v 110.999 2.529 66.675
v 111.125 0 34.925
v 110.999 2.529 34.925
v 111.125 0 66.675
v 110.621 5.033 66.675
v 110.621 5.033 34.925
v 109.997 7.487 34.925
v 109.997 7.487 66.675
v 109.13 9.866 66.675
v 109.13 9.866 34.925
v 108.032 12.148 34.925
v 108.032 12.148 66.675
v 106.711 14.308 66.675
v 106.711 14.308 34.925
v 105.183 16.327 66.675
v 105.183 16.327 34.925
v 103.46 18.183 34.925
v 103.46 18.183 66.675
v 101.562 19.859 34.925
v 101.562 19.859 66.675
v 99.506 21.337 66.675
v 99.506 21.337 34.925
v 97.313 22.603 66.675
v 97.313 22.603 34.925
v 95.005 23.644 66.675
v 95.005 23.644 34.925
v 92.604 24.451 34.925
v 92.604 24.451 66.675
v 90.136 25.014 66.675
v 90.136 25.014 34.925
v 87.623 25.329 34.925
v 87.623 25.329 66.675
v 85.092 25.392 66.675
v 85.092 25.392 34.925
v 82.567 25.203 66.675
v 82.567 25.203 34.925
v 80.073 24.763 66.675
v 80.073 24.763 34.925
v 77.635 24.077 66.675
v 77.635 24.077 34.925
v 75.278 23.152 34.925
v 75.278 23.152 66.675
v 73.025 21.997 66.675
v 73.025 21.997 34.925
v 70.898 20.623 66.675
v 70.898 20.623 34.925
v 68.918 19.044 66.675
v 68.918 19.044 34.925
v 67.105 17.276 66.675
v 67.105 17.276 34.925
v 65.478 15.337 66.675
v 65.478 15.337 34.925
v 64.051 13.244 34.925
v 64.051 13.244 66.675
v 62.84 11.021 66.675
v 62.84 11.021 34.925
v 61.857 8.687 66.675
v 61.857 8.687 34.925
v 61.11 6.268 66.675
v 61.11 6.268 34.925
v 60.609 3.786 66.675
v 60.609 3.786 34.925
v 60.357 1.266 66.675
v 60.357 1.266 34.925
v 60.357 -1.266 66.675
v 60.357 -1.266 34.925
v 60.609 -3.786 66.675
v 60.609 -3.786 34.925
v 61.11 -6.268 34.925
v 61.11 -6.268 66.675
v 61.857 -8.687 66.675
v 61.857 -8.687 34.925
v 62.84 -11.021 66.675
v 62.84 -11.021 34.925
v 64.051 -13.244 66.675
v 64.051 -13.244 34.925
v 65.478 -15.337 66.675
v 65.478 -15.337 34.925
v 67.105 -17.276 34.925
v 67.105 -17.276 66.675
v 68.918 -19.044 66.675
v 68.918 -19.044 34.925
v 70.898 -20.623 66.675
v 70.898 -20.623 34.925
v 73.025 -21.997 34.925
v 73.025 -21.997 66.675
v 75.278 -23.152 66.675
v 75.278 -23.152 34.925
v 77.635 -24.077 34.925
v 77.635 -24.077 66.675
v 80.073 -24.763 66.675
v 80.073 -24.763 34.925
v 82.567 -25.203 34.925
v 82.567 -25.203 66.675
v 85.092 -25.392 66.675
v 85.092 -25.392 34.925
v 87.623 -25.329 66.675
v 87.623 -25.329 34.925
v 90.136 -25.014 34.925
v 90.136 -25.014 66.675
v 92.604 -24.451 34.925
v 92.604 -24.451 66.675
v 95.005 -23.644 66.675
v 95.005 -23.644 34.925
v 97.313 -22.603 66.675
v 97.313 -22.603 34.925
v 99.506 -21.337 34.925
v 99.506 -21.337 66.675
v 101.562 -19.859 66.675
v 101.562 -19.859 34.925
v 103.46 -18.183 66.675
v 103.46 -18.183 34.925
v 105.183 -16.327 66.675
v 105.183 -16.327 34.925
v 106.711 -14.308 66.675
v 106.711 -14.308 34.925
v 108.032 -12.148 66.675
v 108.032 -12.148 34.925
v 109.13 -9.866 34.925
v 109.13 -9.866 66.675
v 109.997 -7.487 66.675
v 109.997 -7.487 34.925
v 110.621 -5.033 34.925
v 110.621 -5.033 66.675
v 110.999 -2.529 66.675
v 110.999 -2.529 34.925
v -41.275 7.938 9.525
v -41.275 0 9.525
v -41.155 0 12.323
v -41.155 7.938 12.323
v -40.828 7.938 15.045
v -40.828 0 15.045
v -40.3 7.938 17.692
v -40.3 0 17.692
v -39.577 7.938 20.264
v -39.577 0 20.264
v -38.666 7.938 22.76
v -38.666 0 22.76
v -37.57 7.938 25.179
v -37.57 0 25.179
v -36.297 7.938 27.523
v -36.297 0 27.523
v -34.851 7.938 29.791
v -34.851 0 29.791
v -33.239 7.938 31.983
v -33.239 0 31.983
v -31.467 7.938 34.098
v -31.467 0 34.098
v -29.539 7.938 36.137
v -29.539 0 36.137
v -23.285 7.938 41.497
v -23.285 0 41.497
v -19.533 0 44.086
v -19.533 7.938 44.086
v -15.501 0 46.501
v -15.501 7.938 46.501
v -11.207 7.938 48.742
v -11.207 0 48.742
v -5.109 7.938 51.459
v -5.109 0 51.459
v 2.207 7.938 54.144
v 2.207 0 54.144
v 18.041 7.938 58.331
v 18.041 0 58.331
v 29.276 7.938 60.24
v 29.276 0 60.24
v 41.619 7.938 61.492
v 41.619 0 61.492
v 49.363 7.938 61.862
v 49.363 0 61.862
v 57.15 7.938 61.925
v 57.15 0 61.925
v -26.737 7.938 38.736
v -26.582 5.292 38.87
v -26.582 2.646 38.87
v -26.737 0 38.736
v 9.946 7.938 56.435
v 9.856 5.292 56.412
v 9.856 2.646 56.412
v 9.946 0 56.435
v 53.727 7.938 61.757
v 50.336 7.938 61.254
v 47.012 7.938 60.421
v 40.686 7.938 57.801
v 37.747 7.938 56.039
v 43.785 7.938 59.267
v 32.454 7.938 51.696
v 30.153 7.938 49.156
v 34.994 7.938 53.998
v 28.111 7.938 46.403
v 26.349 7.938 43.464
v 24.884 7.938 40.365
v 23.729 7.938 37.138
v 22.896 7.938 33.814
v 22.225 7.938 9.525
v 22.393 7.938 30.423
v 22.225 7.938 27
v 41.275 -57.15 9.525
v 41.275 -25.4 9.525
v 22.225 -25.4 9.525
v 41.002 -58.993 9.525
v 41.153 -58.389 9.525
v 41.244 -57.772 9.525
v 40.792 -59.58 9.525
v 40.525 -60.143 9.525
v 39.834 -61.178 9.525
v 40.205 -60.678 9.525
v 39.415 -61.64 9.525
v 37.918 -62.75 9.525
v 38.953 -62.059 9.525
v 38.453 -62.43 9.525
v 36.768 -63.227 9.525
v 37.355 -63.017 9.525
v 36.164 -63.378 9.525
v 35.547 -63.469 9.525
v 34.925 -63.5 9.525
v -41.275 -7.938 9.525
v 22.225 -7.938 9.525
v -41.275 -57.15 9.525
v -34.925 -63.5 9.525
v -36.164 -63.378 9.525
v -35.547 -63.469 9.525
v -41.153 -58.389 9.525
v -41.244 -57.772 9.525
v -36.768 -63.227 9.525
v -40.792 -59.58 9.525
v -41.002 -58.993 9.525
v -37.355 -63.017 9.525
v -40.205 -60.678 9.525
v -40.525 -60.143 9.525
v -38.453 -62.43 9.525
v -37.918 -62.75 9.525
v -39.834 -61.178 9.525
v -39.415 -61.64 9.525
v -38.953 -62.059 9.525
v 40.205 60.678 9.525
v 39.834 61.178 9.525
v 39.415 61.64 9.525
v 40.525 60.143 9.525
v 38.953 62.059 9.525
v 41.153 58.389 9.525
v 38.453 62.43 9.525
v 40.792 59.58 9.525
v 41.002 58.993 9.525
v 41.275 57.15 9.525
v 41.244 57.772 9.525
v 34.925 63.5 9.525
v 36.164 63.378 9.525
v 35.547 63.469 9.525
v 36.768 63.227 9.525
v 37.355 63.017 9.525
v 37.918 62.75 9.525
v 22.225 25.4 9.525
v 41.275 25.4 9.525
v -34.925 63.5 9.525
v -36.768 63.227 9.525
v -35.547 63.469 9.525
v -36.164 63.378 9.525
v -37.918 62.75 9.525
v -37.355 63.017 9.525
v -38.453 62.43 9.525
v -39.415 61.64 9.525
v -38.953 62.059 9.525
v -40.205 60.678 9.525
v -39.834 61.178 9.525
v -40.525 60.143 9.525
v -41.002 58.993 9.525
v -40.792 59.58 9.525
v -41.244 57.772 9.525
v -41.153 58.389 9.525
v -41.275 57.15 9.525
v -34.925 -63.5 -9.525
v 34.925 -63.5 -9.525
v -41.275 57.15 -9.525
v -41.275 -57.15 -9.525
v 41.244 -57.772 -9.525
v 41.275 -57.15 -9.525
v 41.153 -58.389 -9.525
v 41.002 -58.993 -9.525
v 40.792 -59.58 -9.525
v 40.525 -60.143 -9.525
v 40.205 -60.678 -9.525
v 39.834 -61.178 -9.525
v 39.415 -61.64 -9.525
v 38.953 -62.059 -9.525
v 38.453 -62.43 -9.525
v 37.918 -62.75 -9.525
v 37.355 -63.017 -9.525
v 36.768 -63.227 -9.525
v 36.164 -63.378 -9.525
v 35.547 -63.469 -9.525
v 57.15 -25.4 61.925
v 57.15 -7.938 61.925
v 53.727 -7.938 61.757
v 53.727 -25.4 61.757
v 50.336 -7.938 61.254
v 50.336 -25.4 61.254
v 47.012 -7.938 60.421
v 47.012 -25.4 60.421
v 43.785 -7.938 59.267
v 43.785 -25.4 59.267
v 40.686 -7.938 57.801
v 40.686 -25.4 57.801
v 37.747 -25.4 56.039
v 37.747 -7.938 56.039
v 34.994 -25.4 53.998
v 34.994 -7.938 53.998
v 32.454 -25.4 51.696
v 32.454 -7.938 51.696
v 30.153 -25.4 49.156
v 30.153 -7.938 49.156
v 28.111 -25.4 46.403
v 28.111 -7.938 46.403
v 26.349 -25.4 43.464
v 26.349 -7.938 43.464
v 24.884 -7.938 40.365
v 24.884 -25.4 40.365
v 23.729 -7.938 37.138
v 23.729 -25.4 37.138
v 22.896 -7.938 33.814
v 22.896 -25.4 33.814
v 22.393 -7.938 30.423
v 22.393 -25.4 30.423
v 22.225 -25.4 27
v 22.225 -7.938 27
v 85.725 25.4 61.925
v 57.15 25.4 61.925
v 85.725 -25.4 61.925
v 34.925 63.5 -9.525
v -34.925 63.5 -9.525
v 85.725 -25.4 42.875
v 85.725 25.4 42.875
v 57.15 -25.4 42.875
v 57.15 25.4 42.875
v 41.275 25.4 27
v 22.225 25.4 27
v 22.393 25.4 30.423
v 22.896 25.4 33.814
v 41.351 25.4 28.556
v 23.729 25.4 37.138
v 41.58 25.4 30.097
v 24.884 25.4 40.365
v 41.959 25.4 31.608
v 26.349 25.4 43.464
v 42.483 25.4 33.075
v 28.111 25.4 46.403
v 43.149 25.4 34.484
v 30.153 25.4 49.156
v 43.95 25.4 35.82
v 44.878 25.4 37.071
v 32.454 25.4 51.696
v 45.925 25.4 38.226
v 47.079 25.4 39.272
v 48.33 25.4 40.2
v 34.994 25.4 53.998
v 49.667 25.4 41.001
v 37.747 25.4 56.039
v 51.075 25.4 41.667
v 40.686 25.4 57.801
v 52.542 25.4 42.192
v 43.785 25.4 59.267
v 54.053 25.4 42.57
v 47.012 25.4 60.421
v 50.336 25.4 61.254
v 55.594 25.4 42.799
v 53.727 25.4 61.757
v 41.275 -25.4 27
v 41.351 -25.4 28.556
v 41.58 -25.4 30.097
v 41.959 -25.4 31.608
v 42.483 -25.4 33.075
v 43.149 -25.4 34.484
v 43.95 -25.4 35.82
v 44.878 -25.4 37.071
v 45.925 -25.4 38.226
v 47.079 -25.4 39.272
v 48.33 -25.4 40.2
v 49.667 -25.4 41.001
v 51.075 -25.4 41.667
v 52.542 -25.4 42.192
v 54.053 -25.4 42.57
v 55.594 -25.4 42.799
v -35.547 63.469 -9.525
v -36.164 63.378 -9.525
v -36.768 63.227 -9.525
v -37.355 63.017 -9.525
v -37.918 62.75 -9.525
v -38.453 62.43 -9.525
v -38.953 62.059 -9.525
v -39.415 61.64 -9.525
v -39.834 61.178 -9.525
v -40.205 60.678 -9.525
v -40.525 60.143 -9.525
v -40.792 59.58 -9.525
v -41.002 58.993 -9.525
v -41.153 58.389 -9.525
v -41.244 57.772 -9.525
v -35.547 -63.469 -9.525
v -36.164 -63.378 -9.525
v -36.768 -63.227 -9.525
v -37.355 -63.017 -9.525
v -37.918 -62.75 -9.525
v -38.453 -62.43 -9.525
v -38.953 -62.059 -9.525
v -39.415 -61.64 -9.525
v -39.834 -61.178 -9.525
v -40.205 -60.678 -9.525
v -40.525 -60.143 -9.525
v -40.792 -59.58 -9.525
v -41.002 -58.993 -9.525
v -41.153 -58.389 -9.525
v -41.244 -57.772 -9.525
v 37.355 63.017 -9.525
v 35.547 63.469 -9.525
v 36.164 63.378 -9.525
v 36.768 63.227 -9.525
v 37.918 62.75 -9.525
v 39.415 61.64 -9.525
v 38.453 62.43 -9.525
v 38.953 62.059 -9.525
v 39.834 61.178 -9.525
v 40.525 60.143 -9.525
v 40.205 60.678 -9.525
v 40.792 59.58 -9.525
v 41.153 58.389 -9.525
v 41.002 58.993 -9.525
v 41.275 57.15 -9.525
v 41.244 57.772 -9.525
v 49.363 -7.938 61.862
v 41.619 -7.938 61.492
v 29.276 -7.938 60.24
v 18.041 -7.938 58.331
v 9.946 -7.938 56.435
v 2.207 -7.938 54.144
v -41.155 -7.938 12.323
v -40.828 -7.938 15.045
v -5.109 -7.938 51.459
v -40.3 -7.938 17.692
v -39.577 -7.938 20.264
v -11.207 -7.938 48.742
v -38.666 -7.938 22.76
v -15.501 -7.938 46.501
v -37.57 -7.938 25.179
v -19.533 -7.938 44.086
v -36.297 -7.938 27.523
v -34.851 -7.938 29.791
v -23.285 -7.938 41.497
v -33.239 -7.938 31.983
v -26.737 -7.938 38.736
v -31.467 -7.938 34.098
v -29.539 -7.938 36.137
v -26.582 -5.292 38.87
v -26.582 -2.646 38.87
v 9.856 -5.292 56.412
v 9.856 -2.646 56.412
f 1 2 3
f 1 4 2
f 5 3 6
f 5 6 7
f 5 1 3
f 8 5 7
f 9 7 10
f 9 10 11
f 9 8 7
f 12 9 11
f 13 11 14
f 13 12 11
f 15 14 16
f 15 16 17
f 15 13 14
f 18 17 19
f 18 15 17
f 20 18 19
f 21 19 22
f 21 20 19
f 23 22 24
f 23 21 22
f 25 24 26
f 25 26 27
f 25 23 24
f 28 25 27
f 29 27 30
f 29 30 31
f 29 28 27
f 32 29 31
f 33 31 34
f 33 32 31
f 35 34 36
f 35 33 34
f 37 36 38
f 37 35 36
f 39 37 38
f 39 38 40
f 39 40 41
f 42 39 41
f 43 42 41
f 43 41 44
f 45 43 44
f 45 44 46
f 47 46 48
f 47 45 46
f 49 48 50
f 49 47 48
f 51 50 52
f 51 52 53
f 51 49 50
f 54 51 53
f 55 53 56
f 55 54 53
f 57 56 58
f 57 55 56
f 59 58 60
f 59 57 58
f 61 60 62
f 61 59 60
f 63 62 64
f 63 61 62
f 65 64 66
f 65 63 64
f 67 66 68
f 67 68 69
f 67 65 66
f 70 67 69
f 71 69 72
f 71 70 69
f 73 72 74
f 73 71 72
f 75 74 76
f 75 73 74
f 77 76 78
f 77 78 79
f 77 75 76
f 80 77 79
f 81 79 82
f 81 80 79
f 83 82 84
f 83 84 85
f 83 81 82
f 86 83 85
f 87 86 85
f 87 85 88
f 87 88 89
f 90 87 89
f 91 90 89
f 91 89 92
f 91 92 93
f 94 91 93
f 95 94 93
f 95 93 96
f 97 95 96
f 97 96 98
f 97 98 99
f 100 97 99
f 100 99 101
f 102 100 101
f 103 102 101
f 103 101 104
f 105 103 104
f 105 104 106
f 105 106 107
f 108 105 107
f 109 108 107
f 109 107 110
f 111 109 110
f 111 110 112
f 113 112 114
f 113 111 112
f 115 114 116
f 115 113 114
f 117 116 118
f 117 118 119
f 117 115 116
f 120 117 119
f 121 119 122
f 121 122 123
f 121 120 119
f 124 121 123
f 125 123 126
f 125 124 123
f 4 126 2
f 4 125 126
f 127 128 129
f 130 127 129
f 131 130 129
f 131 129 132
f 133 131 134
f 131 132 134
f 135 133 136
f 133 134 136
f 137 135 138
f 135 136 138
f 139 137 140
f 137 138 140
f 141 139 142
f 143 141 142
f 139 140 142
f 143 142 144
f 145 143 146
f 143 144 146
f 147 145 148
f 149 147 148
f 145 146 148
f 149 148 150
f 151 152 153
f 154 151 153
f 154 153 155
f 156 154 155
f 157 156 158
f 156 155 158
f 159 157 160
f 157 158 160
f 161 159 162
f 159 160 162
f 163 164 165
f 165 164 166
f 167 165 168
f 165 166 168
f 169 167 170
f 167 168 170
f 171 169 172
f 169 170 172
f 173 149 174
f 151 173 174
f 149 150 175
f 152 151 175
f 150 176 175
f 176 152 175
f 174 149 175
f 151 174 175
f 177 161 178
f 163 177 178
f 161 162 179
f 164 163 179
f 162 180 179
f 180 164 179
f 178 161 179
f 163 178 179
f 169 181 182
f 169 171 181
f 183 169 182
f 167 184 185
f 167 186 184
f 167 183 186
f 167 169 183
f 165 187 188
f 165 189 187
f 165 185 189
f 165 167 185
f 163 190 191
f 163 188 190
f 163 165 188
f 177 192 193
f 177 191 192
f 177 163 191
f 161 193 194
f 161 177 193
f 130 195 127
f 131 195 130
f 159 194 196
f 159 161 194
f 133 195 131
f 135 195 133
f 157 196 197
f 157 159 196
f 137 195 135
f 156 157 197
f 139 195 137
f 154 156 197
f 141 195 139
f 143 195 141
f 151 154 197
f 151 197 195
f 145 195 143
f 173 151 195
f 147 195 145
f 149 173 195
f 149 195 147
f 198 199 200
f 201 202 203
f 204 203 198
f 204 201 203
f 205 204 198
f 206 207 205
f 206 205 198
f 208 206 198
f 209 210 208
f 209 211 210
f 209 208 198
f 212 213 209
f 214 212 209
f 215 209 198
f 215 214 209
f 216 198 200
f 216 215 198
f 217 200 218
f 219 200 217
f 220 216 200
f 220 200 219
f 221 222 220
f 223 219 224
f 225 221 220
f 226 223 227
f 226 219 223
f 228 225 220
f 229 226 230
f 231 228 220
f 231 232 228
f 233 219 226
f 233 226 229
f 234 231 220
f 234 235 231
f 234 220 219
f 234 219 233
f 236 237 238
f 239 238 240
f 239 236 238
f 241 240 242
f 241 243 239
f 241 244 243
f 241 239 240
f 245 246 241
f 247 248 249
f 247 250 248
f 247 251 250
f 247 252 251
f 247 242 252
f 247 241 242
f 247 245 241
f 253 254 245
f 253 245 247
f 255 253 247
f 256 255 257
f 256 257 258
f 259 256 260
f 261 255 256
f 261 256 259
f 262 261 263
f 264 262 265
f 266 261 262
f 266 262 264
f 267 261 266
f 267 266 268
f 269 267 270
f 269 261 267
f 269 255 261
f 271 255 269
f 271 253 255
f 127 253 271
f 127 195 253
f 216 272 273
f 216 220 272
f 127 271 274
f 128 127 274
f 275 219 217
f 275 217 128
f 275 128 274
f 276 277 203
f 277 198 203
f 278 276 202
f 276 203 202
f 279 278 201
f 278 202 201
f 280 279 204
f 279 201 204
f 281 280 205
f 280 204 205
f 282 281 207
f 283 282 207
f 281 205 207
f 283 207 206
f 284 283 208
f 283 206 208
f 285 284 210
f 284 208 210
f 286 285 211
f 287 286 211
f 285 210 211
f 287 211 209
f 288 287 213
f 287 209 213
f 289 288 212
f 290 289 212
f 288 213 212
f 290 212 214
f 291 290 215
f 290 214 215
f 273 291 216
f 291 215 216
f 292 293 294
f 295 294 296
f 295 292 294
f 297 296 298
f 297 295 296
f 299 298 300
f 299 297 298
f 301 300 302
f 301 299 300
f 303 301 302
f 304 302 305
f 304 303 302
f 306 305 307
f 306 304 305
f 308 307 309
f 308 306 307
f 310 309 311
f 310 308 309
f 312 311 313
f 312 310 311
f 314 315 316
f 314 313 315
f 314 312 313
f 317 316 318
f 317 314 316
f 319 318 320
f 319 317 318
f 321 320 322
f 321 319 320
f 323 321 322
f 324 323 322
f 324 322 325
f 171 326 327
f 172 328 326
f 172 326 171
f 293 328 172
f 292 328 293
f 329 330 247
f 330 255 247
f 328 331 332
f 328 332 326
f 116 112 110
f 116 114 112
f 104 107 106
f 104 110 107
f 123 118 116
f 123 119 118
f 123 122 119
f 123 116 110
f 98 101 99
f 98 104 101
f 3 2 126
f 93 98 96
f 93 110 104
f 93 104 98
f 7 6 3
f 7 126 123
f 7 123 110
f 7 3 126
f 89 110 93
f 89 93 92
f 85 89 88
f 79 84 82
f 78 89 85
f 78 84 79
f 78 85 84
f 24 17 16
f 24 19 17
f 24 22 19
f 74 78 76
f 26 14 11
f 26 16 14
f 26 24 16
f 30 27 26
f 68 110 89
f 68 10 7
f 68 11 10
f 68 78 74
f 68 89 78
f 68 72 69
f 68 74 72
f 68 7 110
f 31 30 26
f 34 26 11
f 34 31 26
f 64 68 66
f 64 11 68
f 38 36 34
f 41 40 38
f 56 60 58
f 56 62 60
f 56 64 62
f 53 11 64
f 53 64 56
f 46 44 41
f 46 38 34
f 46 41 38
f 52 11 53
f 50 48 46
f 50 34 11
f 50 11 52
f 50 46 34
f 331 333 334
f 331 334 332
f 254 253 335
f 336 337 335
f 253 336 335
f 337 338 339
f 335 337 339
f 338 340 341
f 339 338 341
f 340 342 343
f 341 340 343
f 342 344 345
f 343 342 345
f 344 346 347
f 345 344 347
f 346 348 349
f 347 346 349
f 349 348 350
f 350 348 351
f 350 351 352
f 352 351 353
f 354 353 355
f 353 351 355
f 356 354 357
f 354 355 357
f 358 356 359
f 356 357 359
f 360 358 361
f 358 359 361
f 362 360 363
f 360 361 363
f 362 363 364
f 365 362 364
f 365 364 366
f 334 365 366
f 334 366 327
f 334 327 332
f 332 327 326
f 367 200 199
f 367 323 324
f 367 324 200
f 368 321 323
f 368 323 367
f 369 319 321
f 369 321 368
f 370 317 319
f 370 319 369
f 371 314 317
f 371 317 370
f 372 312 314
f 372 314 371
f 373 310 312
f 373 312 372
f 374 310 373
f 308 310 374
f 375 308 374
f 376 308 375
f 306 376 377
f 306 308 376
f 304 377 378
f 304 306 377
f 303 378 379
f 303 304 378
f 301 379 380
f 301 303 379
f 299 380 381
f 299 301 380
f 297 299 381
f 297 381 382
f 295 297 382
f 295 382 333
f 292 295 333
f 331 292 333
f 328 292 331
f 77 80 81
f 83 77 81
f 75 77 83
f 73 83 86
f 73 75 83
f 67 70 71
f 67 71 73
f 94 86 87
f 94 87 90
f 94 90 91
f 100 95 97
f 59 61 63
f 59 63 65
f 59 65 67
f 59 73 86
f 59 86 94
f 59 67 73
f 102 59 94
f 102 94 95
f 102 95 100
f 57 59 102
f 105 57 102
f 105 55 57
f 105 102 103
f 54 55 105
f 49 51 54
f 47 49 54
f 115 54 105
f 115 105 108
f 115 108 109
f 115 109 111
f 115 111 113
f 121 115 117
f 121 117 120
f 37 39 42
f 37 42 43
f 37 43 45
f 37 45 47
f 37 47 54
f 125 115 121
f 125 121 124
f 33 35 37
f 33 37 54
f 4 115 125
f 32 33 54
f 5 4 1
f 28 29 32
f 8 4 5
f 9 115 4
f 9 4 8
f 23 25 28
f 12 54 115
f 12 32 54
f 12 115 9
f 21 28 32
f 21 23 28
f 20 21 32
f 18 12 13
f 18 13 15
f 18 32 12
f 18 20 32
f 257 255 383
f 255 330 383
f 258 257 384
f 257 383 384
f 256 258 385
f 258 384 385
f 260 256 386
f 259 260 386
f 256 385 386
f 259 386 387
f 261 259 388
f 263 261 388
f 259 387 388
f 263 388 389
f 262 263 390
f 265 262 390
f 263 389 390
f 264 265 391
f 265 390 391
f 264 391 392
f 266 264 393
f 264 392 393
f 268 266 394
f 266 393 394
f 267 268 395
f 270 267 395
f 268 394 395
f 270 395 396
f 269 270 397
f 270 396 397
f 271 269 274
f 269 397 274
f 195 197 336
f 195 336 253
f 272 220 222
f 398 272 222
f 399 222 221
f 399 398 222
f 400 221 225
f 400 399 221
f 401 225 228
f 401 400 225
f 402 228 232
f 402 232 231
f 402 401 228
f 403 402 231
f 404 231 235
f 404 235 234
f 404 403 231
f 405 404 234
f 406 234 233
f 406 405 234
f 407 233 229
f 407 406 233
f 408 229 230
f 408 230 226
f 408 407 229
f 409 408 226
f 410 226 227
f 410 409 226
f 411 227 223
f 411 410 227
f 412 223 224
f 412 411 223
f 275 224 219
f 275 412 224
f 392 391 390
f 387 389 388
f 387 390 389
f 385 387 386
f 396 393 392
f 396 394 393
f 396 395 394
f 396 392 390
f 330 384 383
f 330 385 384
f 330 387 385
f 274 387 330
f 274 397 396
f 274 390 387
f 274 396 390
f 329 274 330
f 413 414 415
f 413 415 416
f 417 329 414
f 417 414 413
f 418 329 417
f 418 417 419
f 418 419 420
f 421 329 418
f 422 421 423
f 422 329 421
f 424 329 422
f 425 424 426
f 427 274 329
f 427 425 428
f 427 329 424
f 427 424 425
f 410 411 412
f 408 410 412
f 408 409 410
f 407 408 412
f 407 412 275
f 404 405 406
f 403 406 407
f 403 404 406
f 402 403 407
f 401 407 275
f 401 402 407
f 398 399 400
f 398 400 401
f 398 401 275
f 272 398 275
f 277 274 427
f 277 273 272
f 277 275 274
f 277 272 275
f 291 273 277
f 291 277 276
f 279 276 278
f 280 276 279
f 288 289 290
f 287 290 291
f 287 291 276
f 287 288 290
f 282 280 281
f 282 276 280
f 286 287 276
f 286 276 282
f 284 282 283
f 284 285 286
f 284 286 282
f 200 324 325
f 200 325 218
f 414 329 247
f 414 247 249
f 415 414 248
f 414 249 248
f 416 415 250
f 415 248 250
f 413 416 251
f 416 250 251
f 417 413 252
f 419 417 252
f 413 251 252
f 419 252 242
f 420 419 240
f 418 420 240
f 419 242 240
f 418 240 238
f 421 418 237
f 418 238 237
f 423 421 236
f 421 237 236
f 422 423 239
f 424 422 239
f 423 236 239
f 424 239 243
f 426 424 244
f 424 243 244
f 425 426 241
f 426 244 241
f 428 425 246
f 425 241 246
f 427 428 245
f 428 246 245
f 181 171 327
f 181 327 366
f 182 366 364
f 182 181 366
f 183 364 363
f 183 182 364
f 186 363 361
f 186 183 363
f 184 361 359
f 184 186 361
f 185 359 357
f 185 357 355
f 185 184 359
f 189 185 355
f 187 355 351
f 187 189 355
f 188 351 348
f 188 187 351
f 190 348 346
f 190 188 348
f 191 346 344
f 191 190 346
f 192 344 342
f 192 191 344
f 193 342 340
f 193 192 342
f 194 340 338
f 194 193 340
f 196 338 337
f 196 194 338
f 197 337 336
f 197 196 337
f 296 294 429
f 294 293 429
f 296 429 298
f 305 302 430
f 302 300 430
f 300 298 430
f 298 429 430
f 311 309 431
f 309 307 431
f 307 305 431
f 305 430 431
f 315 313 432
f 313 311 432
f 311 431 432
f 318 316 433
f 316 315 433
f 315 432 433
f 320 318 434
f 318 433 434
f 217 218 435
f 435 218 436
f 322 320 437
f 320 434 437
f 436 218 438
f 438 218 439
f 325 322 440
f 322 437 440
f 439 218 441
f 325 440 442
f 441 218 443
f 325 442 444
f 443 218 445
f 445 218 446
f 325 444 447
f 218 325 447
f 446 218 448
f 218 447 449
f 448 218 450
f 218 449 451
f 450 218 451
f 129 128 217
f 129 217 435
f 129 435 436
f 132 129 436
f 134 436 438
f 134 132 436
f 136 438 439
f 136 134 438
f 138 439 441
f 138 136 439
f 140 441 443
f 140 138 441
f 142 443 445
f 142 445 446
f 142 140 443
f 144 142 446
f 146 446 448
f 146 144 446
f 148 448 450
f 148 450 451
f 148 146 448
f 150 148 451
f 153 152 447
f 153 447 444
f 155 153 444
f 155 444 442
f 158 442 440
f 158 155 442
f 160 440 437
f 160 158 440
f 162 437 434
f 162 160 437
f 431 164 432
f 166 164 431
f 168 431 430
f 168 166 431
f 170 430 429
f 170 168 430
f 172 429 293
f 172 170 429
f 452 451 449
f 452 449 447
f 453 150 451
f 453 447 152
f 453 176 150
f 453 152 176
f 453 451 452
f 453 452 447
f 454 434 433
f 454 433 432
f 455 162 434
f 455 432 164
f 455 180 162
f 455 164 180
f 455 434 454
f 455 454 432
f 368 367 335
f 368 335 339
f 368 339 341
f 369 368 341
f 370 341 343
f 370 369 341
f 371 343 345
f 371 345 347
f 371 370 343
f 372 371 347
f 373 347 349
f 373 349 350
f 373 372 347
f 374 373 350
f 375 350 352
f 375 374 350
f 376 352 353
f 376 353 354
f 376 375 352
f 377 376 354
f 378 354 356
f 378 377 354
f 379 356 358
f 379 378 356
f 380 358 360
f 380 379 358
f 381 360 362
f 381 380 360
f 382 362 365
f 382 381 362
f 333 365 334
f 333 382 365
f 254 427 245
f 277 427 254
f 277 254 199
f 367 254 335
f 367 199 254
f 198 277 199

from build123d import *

# Parameters (mm, degrees)
F1_DEPTH = 63.5
F0_W     = 25.4
F0_H     = 19.05
F2_DEPTH = 25.4
F3_DEPTH = 7.9375
F5_R     = 6.35


with BuildPart() as f1:
    # F0 (on Front) → F1 (new body, symmetric)
    with BuildSketch(Plane.XZ):
        Polygon((-41.275, -9.525), (41.275, -9.525), (41.275, 9.525), (22.225, 9.525), (-41.275, 9.525), align=None)
    extrude(amount=F1_DEPTH, both=True)

    # F0 (on Front) → F2 (join, symmetric)
    with BuildSketch(Plane.XZ):
        with BuildLine():
            Line((22.225, 9.525), (41.275, 9.525))
            Line((41.275, 9.525), (41.275, 27.0002))
            ThreePointArc((41.275, 27.0002), (45.9246798487, 38.2255201513), (57.15, 42.8752))
            Line((57.15, 42.8752), (60.325, 42.8752))
            Line((60.325, 42.8752), (60.325, 61.9252))
            Line((60.325, 61.9252), (57.15, 61.9252))
            ThreePointArc((57.15, 61.9252), (32.4542956671, 51.6959043329), (22.225, 27.0002))
            Line((22.225, 27.0002), (22.225, 9.525))
        make_face()
        with Locations((73.025, 52.4002)):
            Rectangle(F0_W, F0_H)
    extrude(amount=F2_DEPTH, both=True)

    # F0 (on Front) → F3 (join, symmetric)
    with BuildSketch(Plane.XZ):
        with BuildLine():
            add(Edge.make_bspline(
                [(-41.275, 9.525), (-41.0840297129, 44.6967575619), (8.0583218869, 62.5009445303), (57.15, 61.9252)],
                knots=[0, 0, 0, 0, 111.5045361635, 111.5045361635, 111.5045361635, 111.5045361635], degree=3))
            Line((-41.275, 9.525), (22.225, 9.525))
            Line((22.225, 9.525), (22.225, 27.0002))
            ThreePointArc((22.225, 27.0002), (32.4542956671, 51.6959043329), (57.15, 61.9252))
        make_face()
    extrude(amount=F3_DEPTH, both=True)

    # F5
    f5_edges = [f1.edges().sort_by_distance(p)[0] for p in [
        (-41.275, -63.5, 0),
        (41.275, -63.5, 0),
        (41.275, 63.5, 0),
        (-41.275, 63.5, 0),
    ]]
    fillet(f5_edges, radius=F5_R)


with BuildPart() as f4:
    # F0 (on Front) → F4 (revolve)
    with BuildSketch(Plane.XZ):
        Polygon((85.725, 66.675), (85.725, 61.9252), (85.725, 42.8752), (85.725, 34.925), (111.125, 34.925), (111.125, 66.675), align=None)
    revolve(axis=Axis((85.725, 0, 50.8), (0, 0, 1)))


solid = Compound([f1.part, f4.part])
